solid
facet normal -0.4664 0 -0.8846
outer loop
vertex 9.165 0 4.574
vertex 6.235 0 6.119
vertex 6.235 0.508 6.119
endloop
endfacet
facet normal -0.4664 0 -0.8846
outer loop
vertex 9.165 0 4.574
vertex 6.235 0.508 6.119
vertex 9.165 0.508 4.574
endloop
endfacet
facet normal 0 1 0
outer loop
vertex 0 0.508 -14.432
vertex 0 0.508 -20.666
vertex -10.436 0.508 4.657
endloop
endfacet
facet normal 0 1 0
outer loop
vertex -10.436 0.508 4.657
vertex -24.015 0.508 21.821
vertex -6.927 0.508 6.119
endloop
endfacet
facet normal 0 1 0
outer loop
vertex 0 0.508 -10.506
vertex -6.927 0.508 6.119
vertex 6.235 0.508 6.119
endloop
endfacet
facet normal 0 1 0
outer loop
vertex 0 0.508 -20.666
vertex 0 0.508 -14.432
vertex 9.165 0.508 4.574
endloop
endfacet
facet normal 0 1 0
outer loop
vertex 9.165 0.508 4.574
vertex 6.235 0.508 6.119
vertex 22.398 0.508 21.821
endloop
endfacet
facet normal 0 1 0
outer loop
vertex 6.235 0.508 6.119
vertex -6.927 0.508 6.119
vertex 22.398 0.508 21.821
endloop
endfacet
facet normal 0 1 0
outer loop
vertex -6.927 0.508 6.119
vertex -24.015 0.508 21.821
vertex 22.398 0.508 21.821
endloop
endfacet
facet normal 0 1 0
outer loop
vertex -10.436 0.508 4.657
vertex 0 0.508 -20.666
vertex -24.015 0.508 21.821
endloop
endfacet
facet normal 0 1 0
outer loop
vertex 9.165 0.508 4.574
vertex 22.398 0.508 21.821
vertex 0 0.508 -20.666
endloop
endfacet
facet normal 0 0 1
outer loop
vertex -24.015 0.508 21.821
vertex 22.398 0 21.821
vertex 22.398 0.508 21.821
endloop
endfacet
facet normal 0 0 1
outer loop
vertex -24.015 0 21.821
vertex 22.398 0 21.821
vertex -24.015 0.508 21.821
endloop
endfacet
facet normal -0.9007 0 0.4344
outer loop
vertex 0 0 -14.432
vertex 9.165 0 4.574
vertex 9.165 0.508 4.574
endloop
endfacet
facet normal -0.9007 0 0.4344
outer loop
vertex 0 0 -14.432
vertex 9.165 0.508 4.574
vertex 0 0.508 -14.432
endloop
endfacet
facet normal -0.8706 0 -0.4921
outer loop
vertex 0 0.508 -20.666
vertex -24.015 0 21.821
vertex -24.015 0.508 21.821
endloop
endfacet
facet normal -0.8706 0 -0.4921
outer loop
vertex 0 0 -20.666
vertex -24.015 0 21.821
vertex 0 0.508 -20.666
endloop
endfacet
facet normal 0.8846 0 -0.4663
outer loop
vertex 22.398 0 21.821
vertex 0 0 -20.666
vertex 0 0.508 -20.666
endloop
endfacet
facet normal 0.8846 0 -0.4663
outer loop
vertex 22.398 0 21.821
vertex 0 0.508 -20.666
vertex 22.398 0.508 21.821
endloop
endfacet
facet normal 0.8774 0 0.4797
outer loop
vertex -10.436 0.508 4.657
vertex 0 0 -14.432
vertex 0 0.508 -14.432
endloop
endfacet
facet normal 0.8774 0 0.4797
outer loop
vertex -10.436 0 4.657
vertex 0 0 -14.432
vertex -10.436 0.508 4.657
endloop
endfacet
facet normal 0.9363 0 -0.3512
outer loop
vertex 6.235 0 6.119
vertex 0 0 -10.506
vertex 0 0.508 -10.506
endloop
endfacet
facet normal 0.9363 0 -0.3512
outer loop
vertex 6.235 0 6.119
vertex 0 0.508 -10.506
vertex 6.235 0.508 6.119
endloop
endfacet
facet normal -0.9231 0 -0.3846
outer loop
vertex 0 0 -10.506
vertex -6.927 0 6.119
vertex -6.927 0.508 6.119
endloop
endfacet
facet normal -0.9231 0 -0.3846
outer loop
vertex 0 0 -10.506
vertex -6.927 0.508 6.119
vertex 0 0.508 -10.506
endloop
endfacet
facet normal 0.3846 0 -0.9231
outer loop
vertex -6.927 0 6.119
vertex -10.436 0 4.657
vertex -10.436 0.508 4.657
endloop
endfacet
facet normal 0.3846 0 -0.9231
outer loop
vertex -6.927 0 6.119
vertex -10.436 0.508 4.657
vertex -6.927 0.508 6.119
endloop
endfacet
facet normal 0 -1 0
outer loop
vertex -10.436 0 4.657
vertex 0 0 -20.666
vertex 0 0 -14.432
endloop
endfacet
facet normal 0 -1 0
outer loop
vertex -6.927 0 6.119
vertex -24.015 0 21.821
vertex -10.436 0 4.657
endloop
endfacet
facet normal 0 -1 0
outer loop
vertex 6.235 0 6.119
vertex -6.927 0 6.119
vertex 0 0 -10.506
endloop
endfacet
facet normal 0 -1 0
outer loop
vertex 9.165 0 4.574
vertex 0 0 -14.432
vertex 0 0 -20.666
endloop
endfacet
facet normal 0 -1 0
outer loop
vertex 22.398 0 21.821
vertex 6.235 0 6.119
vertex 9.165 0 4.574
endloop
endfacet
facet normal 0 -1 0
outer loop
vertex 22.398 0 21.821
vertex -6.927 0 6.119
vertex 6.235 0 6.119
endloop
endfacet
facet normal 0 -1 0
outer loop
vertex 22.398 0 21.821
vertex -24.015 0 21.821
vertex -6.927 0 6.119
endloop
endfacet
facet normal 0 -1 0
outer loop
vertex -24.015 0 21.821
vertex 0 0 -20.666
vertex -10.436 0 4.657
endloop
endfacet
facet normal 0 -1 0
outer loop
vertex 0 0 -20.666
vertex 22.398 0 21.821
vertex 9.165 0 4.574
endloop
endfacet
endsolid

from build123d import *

# Parameters (mm, degrees)
F1_DEPTH = 0.508


with BuildPart() as f1:
    # F0 (on Front) → F1 (new body)
    with BuildSketch(Plane.XZ):
        Polygon((22.398183, 21.82091), (-24.014546, 21.82091), (0, -20.666365), align=None)
        Polygon((9.164905, 4.574282), (0, -14.431817), (-10.435999, 4.657122), (-6.927273, 6.119091), (0, -10.506364), (6.234545, 6.119091), align=None, mode=Mode.SUBTRACT)
    extrude(amount=-F1_DEPTH)


solid = f1.part
